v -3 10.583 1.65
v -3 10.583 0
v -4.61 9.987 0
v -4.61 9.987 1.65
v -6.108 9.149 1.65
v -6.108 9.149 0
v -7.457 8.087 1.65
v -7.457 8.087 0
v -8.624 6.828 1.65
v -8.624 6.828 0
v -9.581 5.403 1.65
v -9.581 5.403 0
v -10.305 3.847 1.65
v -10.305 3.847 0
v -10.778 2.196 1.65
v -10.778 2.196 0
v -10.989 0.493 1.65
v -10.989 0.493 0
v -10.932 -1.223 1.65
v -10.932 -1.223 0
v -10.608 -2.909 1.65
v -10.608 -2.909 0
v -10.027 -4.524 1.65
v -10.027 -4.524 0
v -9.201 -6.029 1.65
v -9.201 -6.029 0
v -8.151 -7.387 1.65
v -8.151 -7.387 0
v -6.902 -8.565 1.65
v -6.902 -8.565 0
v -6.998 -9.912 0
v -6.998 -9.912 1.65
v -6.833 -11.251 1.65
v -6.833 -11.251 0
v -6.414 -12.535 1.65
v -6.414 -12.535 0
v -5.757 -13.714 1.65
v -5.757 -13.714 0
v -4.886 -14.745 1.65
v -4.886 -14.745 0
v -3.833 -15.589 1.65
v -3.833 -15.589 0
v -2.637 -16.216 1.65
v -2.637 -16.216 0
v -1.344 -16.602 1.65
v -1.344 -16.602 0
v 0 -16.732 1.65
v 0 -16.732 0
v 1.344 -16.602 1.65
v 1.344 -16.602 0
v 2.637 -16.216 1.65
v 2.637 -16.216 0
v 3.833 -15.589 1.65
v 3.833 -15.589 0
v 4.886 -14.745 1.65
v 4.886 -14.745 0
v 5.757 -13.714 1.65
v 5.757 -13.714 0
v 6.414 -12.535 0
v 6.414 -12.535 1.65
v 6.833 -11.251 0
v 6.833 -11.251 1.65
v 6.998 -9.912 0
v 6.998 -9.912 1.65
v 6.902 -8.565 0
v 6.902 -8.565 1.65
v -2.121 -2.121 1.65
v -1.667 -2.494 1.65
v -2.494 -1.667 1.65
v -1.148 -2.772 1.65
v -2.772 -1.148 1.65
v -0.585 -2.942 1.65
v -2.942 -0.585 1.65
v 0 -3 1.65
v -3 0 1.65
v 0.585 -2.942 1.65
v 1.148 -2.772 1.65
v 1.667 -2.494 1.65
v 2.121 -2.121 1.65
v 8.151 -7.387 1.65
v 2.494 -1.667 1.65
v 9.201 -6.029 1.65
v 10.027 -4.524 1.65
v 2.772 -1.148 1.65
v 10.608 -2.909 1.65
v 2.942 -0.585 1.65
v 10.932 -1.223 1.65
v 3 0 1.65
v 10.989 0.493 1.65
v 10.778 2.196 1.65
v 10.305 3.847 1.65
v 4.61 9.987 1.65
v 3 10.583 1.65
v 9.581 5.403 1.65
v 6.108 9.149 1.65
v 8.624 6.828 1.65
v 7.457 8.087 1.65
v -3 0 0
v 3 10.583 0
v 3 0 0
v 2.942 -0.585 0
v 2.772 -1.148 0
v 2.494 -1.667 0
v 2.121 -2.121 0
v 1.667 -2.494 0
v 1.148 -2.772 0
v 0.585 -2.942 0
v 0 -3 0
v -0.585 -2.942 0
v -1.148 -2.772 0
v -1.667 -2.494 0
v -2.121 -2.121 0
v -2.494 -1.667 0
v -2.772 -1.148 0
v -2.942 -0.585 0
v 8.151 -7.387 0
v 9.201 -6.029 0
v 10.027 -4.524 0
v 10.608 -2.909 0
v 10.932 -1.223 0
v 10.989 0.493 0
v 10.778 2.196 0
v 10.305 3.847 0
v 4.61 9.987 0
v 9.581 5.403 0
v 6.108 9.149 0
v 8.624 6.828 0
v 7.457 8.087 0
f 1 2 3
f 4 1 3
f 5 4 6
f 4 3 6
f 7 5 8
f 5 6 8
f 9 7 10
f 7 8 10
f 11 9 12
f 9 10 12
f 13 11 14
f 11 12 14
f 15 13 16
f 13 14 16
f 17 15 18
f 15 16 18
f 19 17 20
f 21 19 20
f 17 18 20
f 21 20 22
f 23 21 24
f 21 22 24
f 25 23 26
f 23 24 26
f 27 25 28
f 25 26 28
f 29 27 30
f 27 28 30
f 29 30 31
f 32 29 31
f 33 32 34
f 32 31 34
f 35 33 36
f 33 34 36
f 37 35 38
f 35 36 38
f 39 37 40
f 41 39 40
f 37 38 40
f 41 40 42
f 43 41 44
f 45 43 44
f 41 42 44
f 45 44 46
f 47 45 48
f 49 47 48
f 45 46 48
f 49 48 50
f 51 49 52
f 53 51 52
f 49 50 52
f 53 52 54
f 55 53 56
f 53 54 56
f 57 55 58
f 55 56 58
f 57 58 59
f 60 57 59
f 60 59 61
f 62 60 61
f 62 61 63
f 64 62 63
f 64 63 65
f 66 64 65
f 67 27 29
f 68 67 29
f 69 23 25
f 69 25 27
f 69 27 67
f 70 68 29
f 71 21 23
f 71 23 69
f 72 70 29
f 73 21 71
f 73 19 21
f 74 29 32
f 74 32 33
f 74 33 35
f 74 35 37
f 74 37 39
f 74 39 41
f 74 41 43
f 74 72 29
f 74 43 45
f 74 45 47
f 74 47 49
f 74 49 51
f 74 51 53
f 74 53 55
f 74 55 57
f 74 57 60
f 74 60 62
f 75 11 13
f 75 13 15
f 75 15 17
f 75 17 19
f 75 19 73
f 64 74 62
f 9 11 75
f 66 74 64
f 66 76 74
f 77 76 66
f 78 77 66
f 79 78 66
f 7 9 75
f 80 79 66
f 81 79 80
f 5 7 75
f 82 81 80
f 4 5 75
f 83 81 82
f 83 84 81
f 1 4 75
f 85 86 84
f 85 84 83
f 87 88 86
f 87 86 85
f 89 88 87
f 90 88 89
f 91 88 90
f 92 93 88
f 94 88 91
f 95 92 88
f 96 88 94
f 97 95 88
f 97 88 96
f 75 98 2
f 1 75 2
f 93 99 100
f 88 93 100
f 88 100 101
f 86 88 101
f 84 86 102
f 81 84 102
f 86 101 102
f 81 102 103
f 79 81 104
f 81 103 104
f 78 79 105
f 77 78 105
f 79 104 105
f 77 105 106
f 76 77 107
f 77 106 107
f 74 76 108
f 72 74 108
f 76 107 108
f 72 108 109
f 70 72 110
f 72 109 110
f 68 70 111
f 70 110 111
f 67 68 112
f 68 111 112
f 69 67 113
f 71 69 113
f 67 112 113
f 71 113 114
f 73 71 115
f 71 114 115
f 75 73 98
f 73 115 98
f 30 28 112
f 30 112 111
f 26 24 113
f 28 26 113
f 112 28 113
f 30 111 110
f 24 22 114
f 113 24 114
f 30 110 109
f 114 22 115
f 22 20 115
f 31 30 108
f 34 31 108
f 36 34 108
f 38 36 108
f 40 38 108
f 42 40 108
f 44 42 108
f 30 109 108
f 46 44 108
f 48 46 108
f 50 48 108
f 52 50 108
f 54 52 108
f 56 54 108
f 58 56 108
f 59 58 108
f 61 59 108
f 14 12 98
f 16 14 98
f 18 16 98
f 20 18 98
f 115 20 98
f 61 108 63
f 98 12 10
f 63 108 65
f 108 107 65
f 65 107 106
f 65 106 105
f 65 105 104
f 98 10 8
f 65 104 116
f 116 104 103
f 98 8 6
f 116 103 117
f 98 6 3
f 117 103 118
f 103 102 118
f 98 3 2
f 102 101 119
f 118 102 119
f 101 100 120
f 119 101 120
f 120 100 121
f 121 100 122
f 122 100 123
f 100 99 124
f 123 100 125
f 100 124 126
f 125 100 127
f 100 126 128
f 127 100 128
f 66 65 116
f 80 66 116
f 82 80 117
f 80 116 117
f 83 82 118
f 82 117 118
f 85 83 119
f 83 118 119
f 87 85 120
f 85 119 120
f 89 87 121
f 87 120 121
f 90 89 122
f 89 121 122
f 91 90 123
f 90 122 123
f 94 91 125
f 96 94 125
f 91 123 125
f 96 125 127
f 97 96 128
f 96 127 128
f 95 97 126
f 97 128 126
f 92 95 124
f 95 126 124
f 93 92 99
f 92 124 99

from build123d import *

# Parameters (mm, degrees)
F1_DEPTH = 1.65


with BuildPart() as f1:
    # F0 (on Top) → F1 (new body)
    with BuildSketch(Plane.XY):
        with BuildLine():
            Line((-3, 0), (-3, 10.583005))
            ThreePointArc((-3, 10.583005), (-10.778469, 2.196498), (-6.902109, -8.565097))
            ThreePointArc((-6.902109, -8.565097), (0, -11), (6.902109, -8.565097))
            ThreePointArc((6.902109, -8.565097), (10.778469, 2.196498), (3, 10.583005))
            Line((3, 10.583005), (3, 0))
            ThreePointArc((3, 0), (0, -3), (-3, 0))
        make_face()
        with BuildLine():
            ThreePointArc((6.902109, -8.565097), (0, -11), (-6.902109, -8.565097))
            ThreePointArc((-6.902109, -8.565097), (0, -16.731671), (6.902109, -8.565097))
        make_face()
    extrude(amount=F1_DEPTH)


solid = f1.part
